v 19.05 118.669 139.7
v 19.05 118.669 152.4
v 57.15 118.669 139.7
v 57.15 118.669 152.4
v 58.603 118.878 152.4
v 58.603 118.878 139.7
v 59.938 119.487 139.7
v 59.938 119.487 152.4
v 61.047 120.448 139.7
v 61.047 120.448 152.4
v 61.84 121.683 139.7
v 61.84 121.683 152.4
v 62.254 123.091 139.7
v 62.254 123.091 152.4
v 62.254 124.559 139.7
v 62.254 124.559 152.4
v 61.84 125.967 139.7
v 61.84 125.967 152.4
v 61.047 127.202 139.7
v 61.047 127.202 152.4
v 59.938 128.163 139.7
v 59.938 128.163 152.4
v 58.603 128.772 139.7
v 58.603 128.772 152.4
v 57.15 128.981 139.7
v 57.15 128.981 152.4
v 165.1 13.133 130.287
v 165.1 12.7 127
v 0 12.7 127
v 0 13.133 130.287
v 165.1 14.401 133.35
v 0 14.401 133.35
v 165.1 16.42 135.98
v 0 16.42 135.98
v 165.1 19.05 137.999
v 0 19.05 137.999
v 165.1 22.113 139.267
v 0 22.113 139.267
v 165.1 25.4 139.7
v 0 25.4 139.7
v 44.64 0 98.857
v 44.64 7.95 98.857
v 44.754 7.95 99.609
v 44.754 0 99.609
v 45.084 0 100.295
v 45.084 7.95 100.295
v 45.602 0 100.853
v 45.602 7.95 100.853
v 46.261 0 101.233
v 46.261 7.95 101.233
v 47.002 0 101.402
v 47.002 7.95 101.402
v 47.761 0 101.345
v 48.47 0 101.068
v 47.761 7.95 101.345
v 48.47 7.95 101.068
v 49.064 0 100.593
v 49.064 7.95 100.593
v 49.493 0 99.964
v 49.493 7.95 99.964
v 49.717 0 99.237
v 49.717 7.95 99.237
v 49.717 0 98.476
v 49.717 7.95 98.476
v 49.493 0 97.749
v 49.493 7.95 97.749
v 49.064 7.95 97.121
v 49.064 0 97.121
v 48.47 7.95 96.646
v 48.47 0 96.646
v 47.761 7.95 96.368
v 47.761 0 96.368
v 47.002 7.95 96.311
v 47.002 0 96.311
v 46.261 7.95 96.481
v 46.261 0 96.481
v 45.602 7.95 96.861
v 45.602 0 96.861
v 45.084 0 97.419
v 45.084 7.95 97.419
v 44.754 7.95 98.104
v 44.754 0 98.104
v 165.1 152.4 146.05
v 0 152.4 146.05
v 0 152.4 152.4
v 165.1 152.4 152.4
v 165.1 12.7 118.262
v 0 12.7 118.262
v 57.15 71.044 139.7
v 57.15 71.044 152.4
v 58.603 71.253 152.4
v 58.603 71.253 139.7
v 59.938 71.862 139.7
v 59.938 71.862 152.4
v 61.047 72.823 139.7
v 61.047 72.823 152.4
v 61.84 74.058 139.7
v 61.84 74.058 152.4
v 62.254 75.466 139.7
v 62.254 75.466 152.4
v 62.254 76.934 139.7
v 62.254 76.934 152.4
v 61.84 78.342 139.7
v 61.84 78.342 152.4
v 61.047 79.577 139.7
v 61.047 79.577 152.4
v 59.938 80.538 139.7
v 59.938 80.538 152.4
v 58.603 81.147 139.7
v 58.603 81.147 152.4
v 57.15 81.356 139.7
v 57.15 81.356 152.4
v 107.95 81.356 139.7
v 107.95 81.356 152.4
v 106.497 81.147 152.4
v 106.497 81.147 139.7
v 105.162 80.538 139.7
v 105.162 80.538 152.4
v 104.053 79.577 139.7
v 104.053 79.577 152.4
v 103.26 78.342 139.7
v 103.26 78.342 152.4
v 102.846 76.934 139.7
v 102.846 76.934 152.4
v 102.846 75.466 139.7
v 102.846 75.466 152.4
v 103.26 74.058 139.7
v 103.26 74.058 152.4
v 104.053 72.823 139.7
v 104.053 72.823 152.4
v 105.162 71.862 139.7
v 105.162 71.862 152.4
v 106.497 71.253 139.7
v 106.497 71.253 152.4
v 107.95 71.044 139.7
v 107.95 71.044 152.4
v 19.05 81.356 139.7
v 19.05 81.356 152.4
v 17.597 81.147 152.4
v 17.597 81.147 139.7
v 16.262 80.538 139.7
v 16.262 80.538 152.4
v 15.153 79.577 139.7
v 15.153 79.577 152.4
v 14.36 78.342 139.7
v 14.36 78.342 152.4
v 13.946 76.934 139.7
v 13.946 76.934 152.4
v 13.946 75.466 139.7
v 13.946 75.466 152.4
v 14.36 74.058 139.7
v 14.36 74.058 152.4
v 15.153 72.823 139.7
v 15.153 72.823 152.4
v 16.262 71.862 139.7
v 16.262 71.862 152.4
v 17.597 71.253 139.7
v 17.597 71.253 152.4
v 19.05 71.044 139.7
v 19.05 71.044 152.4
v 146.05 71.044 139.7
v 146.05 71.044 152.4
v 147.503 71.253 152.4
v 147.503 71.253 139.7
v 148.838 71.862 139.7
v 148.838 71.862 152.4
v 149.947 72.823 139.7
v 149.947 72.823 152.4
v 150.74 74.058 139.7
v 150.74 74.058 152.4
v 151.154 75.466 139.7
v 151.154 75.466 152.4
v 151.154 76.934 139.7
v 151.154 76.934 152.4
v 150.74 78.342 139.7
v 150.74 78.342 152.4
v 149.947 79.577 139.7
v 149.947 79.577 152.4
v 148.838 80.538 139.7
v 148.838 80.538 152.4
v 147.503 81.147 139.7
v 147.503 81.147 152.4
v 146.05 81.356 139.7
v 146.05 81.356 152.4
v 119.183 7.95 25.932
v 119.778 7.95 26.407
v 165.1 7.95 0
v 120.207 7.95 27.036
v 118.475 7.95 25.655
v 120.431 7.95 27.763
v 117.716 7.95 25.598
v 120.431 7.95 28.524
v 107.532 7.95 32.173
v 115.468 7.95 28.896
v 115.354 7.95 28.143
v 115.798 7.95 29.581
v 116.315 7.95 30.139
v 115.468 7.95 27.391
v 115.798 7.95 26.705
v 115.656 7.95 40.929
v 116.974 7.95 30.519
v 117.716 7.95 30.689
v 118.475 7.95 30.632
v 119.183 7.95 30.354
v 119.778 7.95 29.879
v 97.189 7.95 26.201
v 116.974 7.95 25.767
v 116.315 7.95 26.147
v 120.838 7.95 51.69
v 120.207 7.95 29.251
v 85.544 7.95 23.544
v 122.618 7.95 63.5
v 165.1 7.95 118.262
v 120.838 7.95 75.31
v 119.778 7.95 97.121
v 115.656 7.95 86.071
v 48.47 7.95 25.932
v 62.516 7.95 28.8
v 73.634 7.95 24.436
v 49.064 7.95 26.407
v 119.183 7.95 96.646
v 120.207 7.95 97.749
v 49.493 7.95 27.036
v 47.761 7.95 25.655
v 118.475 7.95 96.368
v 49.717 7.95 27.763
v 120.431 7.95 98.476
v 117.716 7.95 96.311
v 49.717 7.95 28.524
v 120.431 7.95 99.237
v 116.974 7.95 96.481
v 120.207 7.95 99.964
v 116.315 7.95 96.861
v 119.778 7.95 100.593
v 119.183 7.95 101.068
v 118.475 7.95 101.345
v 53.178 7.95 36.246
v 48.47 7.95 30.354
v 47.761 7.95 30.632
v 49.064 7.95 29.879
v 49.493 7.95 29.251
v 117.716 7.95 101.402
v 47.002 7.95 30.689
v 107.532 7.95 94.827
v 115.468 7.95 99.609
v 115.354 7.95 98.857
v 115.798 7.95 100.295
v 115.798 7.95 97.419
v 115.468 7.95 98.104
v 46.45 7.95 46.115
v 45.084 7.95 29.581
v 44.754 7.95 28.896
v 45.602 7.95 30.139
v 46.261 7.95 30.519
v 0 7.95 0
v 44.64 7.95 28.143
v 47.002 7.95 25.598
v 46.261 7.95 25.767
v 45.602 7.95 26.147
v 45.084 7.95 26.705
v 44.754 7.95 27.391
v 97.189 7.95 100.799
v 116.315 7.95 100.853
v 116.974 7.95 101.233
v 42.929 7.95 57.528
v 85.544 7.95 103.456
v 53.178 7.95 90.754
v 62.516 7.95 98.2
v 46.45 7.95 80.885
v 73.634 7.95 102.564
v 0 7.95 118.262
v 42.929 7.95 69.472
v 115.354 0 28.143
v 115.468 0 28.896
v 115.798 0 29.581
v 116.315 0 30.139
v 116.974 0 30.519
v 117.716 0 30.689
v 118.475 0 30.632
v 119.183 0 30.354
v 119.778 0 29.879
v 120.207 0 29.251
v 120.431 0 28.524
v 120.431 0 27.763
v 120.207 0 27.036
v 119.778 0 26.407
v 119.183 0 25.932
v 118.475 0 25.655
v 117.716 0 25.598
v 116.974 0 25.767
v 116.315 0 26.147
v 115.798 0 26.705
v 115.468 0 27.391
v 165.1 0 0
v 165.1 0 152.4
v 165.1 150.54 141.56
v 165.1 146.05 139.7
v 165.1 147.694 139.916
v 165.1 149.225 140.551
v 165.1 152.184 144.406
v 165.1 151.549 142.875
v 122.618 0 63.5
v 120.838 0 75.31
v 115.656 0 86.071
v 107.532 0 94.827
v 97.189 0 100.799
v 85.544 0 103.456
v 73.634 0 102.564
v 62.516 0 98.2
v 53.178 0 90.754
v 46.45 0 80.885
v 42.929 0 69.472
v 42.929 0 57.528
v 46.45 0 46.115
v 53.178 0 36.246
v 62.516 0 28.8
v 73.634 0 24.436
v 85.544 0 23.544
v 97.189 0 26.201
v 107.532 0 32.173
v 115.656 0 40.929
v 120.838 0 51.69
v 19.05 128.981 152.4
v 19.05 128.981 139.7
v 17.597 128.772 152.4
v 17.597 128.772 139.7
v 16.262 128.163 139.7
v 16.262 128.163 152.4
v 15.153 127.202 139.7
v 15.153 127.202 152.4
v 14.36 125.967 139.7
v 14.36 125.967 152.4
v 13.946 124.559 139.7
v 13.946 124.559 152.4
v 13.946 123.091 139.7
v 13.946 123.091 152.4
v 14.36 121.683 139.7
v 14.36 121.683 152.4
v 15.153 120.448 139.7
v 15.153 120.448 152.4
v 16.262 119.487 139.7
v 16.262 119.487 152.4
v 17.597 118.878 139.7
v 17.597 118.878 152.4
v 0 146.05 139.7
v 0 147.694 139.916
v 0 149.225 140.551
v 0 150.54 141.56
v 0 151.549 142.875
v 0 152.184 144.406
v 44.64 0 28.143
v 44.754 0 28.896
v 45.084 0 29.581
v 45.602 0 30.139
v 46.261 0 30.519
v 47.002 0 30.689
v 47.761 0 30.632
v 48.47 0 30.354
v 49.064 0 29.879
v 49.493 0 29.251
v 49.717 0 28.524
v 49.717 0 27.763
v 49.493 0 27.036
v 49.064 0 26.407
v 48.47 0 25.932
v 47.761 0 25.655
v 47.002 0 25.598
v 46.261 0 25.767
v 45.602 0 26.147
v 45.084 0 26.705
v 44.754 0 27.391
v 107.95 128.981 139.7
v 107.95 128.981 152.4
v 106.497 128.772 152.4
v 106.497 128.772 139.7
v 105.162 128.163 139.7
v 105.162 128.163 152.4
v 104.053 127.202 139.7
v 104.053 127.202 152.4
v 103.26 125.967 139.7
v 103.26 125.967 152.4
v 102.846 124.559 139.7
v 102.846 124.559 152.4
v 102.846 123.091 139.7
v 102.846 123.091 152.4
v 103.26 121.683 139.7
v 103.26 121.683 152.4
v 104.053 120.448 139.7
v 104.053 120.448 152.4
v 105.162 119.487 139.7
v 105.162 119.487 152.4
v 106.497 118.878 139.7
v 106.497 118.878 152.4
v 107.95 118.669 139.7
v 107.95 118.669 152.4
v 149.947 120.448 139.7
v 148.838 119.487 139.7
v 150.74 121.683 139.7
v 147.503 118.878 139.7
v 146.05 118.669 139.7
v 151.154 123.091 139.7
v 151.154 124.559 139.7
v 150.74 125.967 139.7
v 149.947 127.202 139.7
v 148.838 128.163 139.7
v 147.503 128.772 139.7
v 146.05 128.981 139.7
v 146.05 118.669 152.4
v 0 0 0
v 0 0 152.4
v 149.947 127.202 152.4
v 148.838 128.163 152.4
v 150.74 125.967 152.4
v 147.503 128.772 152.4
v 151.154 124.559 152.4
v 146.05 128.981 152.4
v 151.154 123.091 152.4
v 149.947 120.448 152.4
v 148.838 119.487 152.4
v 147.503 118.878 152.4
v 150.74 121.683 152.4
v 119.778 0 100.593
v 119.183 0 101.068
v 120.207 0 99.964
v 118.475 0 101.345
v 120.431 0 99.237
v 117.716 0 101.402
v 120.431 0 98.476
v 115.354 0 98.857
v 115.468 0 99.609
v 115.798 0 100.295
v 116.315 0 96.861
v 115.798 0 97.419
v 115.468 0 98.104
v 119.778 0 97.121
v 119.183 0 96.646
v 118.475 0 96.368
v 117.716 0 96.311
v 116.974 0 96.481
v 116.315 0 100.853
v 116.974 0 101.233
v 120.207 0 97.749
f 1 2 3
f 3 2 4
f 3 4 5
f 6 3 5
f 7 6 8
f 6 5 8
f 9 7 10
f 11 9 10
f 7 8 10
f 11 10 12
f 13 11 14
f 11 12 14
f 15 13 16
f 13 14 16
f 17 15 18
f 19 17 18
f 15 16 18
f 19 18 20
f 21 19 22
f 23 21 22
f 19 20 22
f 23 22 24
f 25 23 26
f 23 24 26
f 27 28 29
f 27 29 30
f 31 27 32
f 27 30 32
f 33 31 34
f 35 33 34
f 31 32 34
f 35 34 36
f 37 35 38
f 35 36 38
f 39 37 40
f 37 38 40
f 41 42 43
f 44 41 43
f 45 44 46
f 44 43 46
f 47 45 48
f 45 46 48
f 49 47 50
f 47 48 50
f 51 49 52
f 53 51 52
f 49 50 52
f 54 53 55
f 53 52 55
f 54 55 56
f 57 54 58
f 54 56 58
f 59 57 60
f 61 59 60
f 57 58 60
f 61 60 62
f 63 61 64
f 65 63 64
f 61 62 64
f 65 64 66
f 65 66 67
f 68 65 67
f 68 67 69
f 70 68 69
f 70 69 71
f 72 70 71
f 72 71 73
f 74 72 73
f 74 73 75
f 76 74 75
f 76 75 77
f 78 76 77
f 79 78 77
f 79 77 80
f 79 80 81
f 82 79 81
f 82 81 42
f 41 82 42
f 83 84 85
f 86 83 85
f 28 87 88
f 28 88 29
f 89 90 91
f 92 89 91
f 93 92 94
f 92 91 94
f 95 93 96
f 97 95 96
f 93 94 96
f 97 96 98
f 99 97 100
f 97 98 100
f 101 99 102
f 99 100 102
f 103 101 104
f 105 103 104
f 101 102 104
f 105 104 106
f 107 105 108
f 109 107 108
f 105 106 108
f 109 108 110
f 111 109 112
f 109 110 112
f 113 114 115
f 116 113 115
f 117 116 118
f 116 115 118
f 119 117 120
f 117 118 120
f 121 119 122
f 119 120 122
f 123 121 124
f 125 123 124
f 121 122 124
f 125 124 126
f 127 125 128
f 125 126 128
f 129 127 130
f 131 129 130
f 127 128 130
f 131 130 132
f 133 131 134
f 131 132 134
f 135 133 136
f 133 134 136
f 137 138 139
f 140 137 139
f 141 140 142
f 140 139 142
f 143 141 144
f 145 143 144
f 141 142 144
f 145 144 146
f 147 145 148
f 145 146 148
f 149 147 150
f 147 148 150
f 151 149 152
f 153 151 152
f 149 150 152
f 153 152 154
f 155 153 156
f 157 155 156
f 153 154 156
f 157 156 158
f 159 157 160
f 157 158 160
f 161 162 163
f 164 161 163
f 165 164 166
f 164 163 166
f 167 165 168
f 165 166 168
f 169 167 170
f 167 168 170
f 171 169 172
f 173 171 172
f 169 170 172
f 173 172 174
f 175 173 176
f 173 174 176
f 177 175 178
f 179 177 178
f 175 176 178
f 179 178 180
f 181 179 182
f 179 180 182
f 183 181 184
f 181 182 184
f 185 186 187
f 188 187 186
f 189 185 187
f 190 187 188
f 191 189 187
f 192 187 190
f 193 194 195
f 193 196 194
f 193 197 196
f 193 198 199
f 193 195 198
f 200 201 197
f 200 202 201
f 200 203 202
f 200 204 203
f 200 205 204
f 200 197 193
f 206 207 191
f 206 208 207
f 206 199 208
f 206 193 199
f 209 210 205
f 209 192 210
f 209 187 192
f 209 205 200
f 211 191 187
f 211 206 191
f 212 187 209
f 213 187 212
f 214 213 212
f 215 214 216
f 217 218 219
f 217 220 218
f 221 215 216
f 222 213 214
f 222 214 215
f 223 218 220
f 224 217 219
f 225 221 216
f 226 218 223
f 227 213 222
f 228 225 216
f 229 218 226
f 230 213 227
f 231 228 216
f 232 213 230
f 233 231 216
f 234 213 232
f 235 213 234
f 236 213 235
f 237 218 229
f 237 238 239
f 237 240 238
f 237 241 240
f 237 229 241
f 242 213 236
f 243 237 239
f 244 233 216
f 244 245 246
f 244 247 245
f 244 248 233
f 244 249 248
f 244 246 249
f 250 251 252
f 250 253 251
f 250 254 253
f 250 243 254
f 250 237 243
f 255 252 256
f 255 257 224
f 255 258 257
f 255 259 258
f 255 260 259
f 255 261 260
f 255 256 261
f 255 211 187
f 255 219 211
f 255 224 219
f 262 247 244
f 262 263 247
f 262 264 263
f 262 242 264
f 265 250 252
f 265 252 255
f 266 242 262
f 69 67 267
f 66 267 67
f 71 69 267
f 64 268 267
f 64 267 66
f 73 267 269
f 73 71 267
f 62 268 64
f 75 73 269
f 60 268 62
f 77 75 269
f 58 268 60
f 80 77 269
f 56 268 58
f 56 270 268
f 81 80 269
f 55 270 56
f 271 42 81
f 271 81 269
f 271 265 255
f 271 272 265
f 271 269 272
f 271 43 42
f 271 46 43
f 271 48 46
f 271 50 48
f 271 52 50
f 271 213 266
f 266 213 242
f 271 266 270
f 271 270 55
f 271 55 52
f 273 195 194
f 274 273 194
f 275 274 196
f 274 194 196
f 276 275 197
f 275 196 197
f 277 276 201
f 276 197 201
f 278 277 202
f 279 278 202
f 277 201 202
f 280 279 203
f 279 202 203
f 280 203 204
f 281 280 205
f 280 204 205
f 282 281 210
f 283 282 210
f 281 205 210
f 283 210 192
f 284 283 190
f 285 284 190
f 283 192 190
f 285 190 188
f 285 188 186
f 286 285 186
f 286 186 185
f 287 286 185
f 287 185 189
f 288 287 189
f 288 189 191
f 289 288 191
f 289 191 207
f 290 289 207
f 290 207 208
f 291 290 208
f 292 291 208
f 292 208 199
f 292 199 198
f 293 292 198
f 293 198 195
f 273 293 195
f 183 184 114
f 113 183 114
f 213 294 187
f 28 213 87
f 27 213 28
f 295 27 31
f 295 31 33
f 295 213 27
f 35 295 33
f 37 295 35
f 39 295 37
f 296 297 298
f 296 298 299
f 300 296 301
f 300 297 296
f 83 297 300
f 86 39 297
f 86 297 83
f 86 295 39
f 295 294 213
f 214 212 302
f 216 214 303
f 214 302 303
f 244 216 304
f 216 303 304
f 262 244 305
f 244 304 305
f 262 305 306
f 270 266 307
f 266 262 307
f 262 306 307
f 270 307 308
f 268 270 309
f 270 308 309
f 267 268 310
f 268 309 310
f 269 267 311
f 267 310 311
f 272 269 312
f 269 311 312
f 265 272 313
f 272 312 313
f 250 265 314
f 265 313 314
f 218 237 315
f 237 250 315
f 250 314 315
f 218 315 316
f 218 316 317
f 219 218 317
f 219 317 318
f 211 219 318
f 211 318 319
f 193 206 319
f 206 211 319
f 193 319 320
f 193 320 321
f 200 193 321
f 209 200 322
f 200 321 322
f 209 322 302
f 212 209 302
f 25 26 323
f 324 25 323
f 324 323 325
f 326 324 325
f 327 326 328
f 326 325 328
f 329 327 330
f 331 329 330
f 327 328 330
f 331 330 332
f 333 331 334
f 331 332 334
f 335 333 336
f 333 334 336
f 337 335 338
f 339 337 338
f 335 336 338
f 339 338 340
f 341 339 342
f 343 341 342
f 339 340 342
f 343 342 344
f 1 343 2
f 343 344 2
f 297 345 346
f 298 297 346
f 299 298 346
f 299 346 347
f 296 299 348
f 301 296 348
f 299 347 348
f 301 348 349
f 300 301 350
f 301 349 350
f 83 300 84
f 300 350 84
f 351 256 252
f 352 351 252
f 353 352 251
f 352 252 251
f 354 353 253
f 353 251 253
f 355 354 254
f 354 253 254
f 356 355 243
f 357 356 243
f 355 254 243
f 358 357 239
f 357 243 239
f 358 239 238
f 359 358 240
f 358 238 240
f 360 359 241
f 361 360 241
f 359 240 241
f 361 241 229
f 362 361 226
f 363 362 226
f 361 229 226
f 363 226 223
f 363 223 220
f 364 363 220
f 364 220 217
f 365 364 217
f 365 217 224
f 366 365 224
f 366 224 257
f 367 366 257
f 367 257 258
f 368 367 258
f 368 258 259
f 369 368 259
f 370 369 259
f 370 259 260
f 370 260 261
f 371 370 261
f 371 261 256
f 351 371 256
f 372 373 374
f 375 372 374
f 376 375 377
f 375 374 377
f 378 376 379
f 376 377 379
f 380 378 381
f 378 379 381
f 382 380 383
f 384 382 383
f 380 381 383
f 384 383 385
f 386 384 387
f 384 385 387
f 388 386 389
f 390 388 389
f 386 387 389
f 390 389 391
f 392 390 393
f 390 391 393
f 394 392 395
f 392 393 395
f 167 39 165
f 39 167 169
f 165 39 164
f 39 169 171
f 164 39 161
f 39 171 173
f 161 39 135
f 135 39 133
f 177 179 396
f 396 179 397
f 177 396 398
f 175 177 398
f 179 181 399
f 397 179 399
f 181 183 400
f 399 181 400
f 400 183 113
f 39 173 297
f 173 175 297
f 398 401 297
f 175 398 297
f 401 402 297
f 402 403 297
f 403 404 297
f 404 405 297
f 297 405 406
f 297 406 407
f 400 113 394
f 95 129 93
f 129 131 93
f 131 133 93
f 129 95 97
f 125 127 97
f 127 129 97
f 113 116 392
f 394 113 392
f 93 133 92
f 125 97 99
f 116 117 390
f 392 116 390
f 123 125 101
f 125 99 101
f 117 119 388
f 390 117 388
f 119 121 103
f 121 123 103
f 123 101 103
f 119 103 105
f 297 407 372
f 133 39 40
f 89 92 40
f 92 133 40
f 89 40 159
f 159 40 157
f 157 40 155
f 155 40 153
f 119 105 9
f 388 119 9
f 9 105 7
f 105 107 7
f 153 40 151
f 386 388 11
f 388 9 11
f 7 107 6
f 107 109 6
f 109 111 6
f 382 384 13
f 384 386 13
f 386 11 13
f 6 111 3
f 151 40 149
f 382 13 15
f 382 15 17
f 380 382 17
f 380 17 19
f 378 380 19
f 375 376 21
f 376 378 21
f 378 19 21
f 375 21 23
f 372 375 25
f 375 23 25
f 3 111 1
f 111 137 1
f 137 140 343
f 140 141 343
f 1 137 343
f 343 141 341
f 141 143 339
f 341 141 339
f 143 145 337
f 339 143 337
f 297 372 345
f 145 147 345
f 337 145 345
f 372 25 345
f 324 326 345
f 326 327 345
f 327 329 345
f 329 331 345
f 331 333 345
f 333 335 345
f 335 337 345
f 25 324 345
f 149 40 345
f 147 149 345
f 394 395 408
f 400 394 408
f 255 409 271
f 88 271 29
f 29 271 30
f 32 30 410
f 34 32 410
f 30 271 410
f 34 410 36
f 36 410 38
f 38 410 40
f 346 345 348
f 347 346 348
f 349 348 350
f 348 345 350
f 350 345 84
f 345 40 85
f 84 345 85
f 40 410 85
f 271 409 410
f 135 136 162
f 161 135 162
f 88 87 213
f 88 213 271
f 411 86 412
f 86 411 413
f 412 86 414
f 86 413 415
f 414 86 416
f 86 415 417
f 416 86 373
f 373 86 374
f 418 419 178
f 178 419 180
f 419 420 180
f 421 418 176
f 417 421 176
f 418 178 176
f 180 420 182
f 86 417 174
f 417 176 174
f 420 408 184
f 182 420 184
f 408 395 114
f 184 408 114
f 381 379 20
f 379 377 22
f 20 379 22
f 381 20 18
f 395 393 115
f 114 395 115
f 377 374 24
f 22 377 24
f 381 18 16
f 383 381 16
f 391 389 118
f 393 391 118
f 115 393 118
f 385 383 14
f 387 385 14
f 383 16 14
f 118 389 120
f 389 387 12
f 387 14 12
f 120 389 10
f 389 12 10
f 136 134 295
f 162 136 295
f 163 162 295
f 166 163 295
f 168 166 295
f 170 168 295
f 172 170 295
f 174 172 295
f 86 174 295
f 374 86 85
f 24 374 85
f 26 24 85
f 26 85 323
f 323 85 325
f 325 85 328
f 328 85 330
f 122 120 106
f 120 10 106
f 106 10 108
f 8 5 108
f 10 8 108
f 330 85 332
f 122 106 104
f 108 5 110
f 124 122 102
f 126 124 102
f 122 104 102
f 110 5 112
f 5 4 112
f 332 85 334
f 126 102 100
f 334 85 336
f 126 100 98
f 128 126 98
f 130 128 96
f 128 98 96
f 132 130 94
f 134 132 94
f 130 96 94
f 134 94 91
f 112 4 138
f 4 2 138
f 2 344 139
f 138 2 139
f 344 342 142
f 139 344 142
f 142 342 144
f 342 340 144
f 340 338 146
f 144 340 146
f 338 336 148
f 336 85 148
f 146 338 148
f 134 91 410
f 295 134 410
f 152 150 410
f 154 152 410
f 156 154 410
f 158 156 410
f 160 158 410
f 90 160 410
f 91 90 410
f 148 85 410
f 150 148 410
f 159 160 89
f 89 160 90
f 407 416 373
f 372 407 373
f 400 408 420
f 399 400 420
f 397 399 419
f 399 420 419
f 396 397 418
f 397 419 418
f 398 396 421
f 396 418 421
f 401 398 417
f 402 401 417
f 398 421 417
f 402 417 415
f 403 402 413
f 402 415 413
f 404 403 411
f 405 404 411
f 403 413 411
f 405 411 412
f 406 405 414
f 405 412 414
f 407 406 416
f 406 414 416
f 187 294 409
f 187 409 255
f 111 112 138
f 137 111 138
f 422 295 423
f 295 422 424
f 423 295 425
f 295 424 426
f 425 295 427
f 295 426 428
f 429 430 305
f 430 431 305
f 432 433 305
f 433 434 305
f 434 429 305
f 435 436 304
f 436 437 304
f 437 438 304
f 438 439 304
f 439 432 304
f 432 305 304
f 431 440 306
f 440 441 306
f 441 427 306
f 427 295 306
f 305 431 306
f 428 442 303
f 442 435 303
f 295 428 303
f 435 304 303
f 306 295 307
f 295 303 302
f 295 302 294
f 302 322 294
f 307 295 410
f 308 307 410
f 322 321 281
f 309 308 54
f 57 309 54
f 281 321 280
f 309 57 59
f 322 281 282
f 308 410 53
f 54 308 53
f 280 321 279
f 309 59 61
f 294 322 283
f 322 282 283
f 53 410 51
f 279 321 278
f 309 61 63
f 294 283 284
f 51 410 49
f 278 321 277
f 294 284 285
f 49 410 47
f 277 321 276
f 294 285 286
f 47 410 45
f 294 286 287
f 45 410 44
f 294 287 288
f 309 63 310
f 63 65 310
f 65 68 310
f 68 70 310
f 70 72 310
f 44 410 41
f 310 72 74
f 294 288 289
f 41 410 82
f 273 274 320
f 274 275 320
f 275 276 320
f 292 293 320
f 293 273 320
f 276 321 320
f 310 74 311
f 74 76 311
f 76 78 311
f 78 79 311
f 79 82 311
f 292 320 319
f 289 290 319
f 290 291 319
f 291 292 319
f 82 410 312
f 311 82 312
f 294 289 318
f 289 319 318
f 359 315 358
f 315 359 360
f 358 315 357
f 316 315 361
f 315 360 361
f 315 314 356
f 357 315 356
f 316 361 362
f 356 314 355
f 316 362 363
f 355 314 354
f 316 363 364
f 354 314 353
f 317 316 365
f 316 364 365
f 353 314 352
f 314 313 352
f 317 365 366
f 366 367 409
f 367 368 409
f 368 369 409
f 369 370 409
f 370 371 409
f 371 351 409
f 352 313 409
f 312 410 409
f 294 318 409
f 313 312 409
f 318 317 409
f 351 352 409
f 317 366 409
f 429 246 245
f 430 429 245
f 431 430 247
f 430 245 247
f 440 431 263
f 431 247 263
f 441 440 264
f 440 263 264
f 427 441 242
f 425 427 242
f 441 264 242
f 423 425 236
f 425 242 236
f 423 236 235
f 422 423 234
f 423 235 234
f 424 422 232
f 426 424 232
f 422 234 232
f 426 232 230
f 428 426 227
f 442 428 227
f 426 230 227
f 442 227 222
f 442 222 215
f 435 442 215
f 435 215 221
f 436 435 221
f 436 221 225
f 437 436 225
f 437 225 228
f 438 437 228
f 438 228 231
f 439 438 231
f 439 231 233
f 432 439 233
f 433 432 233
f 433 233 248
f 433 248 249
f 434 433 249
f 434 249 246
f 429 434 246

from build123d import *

# Parameters (mm, degrees)
F1_DEPTH  = 165.1
F2_R      = 40.0685
F3_DEPTH  = 25.4
F6_D      = 5.1054
F9_DEPTH  = 25.4
F10_W     = 165.1
F10_H     = 118.2624
F10_R     = 2.5527
F10_R_2   = 40.0685
F11_DEPTH = 4.7498


with BuildPart() as f1:
    # F0 (on Right) → F1 (new body)
    with BuildSketch(Plane.YZ):
        with BuildLine():
            Line((0, 152.4), (0, 0))
            Line((0, 0), (12.7, 0))
            Line((12.7, 0), (12.7, 127))
            ThreePointArc((12.7, 127), (16.4197438789, 135.9802561211), (25.4, 139.7))
            Line((25.4, 139.7), (146.05, 139.7))
            ThreePointArc((146.05, 139.7), (150.5401280605, 141.5598719395), (152.4, 146.05))
            Line((152.4, 146.05), (152.4, 152.4))
            Line((152.4, 152.4), (0, 152.4))
        make_face()
    extrude(amount=F1_DEPTH)

    # F2 (on face) → F3 (cut)
    with BuildSketch(Plane.XZ):
        with Locations((82.55, 63.5)):
            Circle(F2_R)
    extrude(amount=-F3_DEPTH, mode=Mode.SUBTRACT)

    # F6 (through all)
    with Locations(Plane.XZ):
        with Locations((47.1932, 98.8568), (117.9068, 98.8568), (117.9068, 28.1432), (47.1932, 28.1432)):
            Hole(F6_D / 2)

    # F8 (on face) → F9 (cut)
    with BuildSketch(Plane.XY.offset(152.4)):
        with BuildLine():
            ThreePointArc((19.05, 128.9812), (13.8938, 123.825), (19.05, 118.6688))
            Line((19.05, 118.6688), (57.15, 118.6688))
            ThreePointArc((57.15, 118.6688), (62.3062, 123.825), (57.15, 128.9812))
            Line((57.15, 128.9812), (19.05, 128.9812))
        make_face()
        with BuildLine():
            ThreePointArc((107.95, 128.9812), (102.7938, 123.825), (107.95, 118.6688))
            Line((107.95, 118.6688), (146.05, 118.6688))
            ThreePointArc((146.05, 118.6688), (151.2062, 123.825), (146.05, 128.9812))
            Line((146.05, 128.9812), (107.95, 128.9812))
        make_face()
        with BuildLine():
            ThreePointArc((107.95, 81.3562), (102.7938, 76.2), (107.95, 71.0438))
            Line((107.95, 71.0438), (146.05, 71.0438))
            ThreePointArc((146.05, 71.0438), (151.2062, 76.2), (146.05, 81.3562))
            Line((146.05, 81.3562), (107.95, 81.3562))
        make_face()
        with BuildLine():
            ThreePointArc((19.05, 81.3562), (13.8938, 76.2), (19.05, 71.0438))
            Line((19.05, 71.0438), (57.15, 71.0438))
            ThreePointArc((57.15, 71.0438), (62.3062, 76.2), (57.15, 81.3562))
            Line((57.15, 81.3562), (19.05, 81.3562))
        make_face()
    extrude(amount=-F9_DEPTH, mode=Mode.SUBTRACT)

    # F10 (on face) → F11 (cut)
    with BuildSketch(Plane(origin=(0, 12.7, 0), x_dir=(-1, 0, 0), z_dir=(0, 1, 0))):
        with Locations((-82.55, 59.1312)):
            Rectangle(F10_W, F10_H)
        with Locations((-117.9068, 28.1432)):
            Circle(F10_R, mode=Mode.SUBTRACT)
        with Locations((-47.1932, 28.1432)):
            Circle(F10_R, mode=Mode.SUBTRACT)
        with Locations((-117.9068, 98.8568)):
            Circle(F10_R, mode=Mode.SUBTRACT)
        with Locations((-82.55, 63.5)):
            Circle(F10_R_2, mode=Mode.SUBTRACT)
        with Locations((-47.1932, 98.8568)):
            Circle(F10_R, mode=Mode.SUBTRACT)
    extrude(amount=-F11_DEPTH, mode=Mode.SUBTRACT)


solid = f1.part
